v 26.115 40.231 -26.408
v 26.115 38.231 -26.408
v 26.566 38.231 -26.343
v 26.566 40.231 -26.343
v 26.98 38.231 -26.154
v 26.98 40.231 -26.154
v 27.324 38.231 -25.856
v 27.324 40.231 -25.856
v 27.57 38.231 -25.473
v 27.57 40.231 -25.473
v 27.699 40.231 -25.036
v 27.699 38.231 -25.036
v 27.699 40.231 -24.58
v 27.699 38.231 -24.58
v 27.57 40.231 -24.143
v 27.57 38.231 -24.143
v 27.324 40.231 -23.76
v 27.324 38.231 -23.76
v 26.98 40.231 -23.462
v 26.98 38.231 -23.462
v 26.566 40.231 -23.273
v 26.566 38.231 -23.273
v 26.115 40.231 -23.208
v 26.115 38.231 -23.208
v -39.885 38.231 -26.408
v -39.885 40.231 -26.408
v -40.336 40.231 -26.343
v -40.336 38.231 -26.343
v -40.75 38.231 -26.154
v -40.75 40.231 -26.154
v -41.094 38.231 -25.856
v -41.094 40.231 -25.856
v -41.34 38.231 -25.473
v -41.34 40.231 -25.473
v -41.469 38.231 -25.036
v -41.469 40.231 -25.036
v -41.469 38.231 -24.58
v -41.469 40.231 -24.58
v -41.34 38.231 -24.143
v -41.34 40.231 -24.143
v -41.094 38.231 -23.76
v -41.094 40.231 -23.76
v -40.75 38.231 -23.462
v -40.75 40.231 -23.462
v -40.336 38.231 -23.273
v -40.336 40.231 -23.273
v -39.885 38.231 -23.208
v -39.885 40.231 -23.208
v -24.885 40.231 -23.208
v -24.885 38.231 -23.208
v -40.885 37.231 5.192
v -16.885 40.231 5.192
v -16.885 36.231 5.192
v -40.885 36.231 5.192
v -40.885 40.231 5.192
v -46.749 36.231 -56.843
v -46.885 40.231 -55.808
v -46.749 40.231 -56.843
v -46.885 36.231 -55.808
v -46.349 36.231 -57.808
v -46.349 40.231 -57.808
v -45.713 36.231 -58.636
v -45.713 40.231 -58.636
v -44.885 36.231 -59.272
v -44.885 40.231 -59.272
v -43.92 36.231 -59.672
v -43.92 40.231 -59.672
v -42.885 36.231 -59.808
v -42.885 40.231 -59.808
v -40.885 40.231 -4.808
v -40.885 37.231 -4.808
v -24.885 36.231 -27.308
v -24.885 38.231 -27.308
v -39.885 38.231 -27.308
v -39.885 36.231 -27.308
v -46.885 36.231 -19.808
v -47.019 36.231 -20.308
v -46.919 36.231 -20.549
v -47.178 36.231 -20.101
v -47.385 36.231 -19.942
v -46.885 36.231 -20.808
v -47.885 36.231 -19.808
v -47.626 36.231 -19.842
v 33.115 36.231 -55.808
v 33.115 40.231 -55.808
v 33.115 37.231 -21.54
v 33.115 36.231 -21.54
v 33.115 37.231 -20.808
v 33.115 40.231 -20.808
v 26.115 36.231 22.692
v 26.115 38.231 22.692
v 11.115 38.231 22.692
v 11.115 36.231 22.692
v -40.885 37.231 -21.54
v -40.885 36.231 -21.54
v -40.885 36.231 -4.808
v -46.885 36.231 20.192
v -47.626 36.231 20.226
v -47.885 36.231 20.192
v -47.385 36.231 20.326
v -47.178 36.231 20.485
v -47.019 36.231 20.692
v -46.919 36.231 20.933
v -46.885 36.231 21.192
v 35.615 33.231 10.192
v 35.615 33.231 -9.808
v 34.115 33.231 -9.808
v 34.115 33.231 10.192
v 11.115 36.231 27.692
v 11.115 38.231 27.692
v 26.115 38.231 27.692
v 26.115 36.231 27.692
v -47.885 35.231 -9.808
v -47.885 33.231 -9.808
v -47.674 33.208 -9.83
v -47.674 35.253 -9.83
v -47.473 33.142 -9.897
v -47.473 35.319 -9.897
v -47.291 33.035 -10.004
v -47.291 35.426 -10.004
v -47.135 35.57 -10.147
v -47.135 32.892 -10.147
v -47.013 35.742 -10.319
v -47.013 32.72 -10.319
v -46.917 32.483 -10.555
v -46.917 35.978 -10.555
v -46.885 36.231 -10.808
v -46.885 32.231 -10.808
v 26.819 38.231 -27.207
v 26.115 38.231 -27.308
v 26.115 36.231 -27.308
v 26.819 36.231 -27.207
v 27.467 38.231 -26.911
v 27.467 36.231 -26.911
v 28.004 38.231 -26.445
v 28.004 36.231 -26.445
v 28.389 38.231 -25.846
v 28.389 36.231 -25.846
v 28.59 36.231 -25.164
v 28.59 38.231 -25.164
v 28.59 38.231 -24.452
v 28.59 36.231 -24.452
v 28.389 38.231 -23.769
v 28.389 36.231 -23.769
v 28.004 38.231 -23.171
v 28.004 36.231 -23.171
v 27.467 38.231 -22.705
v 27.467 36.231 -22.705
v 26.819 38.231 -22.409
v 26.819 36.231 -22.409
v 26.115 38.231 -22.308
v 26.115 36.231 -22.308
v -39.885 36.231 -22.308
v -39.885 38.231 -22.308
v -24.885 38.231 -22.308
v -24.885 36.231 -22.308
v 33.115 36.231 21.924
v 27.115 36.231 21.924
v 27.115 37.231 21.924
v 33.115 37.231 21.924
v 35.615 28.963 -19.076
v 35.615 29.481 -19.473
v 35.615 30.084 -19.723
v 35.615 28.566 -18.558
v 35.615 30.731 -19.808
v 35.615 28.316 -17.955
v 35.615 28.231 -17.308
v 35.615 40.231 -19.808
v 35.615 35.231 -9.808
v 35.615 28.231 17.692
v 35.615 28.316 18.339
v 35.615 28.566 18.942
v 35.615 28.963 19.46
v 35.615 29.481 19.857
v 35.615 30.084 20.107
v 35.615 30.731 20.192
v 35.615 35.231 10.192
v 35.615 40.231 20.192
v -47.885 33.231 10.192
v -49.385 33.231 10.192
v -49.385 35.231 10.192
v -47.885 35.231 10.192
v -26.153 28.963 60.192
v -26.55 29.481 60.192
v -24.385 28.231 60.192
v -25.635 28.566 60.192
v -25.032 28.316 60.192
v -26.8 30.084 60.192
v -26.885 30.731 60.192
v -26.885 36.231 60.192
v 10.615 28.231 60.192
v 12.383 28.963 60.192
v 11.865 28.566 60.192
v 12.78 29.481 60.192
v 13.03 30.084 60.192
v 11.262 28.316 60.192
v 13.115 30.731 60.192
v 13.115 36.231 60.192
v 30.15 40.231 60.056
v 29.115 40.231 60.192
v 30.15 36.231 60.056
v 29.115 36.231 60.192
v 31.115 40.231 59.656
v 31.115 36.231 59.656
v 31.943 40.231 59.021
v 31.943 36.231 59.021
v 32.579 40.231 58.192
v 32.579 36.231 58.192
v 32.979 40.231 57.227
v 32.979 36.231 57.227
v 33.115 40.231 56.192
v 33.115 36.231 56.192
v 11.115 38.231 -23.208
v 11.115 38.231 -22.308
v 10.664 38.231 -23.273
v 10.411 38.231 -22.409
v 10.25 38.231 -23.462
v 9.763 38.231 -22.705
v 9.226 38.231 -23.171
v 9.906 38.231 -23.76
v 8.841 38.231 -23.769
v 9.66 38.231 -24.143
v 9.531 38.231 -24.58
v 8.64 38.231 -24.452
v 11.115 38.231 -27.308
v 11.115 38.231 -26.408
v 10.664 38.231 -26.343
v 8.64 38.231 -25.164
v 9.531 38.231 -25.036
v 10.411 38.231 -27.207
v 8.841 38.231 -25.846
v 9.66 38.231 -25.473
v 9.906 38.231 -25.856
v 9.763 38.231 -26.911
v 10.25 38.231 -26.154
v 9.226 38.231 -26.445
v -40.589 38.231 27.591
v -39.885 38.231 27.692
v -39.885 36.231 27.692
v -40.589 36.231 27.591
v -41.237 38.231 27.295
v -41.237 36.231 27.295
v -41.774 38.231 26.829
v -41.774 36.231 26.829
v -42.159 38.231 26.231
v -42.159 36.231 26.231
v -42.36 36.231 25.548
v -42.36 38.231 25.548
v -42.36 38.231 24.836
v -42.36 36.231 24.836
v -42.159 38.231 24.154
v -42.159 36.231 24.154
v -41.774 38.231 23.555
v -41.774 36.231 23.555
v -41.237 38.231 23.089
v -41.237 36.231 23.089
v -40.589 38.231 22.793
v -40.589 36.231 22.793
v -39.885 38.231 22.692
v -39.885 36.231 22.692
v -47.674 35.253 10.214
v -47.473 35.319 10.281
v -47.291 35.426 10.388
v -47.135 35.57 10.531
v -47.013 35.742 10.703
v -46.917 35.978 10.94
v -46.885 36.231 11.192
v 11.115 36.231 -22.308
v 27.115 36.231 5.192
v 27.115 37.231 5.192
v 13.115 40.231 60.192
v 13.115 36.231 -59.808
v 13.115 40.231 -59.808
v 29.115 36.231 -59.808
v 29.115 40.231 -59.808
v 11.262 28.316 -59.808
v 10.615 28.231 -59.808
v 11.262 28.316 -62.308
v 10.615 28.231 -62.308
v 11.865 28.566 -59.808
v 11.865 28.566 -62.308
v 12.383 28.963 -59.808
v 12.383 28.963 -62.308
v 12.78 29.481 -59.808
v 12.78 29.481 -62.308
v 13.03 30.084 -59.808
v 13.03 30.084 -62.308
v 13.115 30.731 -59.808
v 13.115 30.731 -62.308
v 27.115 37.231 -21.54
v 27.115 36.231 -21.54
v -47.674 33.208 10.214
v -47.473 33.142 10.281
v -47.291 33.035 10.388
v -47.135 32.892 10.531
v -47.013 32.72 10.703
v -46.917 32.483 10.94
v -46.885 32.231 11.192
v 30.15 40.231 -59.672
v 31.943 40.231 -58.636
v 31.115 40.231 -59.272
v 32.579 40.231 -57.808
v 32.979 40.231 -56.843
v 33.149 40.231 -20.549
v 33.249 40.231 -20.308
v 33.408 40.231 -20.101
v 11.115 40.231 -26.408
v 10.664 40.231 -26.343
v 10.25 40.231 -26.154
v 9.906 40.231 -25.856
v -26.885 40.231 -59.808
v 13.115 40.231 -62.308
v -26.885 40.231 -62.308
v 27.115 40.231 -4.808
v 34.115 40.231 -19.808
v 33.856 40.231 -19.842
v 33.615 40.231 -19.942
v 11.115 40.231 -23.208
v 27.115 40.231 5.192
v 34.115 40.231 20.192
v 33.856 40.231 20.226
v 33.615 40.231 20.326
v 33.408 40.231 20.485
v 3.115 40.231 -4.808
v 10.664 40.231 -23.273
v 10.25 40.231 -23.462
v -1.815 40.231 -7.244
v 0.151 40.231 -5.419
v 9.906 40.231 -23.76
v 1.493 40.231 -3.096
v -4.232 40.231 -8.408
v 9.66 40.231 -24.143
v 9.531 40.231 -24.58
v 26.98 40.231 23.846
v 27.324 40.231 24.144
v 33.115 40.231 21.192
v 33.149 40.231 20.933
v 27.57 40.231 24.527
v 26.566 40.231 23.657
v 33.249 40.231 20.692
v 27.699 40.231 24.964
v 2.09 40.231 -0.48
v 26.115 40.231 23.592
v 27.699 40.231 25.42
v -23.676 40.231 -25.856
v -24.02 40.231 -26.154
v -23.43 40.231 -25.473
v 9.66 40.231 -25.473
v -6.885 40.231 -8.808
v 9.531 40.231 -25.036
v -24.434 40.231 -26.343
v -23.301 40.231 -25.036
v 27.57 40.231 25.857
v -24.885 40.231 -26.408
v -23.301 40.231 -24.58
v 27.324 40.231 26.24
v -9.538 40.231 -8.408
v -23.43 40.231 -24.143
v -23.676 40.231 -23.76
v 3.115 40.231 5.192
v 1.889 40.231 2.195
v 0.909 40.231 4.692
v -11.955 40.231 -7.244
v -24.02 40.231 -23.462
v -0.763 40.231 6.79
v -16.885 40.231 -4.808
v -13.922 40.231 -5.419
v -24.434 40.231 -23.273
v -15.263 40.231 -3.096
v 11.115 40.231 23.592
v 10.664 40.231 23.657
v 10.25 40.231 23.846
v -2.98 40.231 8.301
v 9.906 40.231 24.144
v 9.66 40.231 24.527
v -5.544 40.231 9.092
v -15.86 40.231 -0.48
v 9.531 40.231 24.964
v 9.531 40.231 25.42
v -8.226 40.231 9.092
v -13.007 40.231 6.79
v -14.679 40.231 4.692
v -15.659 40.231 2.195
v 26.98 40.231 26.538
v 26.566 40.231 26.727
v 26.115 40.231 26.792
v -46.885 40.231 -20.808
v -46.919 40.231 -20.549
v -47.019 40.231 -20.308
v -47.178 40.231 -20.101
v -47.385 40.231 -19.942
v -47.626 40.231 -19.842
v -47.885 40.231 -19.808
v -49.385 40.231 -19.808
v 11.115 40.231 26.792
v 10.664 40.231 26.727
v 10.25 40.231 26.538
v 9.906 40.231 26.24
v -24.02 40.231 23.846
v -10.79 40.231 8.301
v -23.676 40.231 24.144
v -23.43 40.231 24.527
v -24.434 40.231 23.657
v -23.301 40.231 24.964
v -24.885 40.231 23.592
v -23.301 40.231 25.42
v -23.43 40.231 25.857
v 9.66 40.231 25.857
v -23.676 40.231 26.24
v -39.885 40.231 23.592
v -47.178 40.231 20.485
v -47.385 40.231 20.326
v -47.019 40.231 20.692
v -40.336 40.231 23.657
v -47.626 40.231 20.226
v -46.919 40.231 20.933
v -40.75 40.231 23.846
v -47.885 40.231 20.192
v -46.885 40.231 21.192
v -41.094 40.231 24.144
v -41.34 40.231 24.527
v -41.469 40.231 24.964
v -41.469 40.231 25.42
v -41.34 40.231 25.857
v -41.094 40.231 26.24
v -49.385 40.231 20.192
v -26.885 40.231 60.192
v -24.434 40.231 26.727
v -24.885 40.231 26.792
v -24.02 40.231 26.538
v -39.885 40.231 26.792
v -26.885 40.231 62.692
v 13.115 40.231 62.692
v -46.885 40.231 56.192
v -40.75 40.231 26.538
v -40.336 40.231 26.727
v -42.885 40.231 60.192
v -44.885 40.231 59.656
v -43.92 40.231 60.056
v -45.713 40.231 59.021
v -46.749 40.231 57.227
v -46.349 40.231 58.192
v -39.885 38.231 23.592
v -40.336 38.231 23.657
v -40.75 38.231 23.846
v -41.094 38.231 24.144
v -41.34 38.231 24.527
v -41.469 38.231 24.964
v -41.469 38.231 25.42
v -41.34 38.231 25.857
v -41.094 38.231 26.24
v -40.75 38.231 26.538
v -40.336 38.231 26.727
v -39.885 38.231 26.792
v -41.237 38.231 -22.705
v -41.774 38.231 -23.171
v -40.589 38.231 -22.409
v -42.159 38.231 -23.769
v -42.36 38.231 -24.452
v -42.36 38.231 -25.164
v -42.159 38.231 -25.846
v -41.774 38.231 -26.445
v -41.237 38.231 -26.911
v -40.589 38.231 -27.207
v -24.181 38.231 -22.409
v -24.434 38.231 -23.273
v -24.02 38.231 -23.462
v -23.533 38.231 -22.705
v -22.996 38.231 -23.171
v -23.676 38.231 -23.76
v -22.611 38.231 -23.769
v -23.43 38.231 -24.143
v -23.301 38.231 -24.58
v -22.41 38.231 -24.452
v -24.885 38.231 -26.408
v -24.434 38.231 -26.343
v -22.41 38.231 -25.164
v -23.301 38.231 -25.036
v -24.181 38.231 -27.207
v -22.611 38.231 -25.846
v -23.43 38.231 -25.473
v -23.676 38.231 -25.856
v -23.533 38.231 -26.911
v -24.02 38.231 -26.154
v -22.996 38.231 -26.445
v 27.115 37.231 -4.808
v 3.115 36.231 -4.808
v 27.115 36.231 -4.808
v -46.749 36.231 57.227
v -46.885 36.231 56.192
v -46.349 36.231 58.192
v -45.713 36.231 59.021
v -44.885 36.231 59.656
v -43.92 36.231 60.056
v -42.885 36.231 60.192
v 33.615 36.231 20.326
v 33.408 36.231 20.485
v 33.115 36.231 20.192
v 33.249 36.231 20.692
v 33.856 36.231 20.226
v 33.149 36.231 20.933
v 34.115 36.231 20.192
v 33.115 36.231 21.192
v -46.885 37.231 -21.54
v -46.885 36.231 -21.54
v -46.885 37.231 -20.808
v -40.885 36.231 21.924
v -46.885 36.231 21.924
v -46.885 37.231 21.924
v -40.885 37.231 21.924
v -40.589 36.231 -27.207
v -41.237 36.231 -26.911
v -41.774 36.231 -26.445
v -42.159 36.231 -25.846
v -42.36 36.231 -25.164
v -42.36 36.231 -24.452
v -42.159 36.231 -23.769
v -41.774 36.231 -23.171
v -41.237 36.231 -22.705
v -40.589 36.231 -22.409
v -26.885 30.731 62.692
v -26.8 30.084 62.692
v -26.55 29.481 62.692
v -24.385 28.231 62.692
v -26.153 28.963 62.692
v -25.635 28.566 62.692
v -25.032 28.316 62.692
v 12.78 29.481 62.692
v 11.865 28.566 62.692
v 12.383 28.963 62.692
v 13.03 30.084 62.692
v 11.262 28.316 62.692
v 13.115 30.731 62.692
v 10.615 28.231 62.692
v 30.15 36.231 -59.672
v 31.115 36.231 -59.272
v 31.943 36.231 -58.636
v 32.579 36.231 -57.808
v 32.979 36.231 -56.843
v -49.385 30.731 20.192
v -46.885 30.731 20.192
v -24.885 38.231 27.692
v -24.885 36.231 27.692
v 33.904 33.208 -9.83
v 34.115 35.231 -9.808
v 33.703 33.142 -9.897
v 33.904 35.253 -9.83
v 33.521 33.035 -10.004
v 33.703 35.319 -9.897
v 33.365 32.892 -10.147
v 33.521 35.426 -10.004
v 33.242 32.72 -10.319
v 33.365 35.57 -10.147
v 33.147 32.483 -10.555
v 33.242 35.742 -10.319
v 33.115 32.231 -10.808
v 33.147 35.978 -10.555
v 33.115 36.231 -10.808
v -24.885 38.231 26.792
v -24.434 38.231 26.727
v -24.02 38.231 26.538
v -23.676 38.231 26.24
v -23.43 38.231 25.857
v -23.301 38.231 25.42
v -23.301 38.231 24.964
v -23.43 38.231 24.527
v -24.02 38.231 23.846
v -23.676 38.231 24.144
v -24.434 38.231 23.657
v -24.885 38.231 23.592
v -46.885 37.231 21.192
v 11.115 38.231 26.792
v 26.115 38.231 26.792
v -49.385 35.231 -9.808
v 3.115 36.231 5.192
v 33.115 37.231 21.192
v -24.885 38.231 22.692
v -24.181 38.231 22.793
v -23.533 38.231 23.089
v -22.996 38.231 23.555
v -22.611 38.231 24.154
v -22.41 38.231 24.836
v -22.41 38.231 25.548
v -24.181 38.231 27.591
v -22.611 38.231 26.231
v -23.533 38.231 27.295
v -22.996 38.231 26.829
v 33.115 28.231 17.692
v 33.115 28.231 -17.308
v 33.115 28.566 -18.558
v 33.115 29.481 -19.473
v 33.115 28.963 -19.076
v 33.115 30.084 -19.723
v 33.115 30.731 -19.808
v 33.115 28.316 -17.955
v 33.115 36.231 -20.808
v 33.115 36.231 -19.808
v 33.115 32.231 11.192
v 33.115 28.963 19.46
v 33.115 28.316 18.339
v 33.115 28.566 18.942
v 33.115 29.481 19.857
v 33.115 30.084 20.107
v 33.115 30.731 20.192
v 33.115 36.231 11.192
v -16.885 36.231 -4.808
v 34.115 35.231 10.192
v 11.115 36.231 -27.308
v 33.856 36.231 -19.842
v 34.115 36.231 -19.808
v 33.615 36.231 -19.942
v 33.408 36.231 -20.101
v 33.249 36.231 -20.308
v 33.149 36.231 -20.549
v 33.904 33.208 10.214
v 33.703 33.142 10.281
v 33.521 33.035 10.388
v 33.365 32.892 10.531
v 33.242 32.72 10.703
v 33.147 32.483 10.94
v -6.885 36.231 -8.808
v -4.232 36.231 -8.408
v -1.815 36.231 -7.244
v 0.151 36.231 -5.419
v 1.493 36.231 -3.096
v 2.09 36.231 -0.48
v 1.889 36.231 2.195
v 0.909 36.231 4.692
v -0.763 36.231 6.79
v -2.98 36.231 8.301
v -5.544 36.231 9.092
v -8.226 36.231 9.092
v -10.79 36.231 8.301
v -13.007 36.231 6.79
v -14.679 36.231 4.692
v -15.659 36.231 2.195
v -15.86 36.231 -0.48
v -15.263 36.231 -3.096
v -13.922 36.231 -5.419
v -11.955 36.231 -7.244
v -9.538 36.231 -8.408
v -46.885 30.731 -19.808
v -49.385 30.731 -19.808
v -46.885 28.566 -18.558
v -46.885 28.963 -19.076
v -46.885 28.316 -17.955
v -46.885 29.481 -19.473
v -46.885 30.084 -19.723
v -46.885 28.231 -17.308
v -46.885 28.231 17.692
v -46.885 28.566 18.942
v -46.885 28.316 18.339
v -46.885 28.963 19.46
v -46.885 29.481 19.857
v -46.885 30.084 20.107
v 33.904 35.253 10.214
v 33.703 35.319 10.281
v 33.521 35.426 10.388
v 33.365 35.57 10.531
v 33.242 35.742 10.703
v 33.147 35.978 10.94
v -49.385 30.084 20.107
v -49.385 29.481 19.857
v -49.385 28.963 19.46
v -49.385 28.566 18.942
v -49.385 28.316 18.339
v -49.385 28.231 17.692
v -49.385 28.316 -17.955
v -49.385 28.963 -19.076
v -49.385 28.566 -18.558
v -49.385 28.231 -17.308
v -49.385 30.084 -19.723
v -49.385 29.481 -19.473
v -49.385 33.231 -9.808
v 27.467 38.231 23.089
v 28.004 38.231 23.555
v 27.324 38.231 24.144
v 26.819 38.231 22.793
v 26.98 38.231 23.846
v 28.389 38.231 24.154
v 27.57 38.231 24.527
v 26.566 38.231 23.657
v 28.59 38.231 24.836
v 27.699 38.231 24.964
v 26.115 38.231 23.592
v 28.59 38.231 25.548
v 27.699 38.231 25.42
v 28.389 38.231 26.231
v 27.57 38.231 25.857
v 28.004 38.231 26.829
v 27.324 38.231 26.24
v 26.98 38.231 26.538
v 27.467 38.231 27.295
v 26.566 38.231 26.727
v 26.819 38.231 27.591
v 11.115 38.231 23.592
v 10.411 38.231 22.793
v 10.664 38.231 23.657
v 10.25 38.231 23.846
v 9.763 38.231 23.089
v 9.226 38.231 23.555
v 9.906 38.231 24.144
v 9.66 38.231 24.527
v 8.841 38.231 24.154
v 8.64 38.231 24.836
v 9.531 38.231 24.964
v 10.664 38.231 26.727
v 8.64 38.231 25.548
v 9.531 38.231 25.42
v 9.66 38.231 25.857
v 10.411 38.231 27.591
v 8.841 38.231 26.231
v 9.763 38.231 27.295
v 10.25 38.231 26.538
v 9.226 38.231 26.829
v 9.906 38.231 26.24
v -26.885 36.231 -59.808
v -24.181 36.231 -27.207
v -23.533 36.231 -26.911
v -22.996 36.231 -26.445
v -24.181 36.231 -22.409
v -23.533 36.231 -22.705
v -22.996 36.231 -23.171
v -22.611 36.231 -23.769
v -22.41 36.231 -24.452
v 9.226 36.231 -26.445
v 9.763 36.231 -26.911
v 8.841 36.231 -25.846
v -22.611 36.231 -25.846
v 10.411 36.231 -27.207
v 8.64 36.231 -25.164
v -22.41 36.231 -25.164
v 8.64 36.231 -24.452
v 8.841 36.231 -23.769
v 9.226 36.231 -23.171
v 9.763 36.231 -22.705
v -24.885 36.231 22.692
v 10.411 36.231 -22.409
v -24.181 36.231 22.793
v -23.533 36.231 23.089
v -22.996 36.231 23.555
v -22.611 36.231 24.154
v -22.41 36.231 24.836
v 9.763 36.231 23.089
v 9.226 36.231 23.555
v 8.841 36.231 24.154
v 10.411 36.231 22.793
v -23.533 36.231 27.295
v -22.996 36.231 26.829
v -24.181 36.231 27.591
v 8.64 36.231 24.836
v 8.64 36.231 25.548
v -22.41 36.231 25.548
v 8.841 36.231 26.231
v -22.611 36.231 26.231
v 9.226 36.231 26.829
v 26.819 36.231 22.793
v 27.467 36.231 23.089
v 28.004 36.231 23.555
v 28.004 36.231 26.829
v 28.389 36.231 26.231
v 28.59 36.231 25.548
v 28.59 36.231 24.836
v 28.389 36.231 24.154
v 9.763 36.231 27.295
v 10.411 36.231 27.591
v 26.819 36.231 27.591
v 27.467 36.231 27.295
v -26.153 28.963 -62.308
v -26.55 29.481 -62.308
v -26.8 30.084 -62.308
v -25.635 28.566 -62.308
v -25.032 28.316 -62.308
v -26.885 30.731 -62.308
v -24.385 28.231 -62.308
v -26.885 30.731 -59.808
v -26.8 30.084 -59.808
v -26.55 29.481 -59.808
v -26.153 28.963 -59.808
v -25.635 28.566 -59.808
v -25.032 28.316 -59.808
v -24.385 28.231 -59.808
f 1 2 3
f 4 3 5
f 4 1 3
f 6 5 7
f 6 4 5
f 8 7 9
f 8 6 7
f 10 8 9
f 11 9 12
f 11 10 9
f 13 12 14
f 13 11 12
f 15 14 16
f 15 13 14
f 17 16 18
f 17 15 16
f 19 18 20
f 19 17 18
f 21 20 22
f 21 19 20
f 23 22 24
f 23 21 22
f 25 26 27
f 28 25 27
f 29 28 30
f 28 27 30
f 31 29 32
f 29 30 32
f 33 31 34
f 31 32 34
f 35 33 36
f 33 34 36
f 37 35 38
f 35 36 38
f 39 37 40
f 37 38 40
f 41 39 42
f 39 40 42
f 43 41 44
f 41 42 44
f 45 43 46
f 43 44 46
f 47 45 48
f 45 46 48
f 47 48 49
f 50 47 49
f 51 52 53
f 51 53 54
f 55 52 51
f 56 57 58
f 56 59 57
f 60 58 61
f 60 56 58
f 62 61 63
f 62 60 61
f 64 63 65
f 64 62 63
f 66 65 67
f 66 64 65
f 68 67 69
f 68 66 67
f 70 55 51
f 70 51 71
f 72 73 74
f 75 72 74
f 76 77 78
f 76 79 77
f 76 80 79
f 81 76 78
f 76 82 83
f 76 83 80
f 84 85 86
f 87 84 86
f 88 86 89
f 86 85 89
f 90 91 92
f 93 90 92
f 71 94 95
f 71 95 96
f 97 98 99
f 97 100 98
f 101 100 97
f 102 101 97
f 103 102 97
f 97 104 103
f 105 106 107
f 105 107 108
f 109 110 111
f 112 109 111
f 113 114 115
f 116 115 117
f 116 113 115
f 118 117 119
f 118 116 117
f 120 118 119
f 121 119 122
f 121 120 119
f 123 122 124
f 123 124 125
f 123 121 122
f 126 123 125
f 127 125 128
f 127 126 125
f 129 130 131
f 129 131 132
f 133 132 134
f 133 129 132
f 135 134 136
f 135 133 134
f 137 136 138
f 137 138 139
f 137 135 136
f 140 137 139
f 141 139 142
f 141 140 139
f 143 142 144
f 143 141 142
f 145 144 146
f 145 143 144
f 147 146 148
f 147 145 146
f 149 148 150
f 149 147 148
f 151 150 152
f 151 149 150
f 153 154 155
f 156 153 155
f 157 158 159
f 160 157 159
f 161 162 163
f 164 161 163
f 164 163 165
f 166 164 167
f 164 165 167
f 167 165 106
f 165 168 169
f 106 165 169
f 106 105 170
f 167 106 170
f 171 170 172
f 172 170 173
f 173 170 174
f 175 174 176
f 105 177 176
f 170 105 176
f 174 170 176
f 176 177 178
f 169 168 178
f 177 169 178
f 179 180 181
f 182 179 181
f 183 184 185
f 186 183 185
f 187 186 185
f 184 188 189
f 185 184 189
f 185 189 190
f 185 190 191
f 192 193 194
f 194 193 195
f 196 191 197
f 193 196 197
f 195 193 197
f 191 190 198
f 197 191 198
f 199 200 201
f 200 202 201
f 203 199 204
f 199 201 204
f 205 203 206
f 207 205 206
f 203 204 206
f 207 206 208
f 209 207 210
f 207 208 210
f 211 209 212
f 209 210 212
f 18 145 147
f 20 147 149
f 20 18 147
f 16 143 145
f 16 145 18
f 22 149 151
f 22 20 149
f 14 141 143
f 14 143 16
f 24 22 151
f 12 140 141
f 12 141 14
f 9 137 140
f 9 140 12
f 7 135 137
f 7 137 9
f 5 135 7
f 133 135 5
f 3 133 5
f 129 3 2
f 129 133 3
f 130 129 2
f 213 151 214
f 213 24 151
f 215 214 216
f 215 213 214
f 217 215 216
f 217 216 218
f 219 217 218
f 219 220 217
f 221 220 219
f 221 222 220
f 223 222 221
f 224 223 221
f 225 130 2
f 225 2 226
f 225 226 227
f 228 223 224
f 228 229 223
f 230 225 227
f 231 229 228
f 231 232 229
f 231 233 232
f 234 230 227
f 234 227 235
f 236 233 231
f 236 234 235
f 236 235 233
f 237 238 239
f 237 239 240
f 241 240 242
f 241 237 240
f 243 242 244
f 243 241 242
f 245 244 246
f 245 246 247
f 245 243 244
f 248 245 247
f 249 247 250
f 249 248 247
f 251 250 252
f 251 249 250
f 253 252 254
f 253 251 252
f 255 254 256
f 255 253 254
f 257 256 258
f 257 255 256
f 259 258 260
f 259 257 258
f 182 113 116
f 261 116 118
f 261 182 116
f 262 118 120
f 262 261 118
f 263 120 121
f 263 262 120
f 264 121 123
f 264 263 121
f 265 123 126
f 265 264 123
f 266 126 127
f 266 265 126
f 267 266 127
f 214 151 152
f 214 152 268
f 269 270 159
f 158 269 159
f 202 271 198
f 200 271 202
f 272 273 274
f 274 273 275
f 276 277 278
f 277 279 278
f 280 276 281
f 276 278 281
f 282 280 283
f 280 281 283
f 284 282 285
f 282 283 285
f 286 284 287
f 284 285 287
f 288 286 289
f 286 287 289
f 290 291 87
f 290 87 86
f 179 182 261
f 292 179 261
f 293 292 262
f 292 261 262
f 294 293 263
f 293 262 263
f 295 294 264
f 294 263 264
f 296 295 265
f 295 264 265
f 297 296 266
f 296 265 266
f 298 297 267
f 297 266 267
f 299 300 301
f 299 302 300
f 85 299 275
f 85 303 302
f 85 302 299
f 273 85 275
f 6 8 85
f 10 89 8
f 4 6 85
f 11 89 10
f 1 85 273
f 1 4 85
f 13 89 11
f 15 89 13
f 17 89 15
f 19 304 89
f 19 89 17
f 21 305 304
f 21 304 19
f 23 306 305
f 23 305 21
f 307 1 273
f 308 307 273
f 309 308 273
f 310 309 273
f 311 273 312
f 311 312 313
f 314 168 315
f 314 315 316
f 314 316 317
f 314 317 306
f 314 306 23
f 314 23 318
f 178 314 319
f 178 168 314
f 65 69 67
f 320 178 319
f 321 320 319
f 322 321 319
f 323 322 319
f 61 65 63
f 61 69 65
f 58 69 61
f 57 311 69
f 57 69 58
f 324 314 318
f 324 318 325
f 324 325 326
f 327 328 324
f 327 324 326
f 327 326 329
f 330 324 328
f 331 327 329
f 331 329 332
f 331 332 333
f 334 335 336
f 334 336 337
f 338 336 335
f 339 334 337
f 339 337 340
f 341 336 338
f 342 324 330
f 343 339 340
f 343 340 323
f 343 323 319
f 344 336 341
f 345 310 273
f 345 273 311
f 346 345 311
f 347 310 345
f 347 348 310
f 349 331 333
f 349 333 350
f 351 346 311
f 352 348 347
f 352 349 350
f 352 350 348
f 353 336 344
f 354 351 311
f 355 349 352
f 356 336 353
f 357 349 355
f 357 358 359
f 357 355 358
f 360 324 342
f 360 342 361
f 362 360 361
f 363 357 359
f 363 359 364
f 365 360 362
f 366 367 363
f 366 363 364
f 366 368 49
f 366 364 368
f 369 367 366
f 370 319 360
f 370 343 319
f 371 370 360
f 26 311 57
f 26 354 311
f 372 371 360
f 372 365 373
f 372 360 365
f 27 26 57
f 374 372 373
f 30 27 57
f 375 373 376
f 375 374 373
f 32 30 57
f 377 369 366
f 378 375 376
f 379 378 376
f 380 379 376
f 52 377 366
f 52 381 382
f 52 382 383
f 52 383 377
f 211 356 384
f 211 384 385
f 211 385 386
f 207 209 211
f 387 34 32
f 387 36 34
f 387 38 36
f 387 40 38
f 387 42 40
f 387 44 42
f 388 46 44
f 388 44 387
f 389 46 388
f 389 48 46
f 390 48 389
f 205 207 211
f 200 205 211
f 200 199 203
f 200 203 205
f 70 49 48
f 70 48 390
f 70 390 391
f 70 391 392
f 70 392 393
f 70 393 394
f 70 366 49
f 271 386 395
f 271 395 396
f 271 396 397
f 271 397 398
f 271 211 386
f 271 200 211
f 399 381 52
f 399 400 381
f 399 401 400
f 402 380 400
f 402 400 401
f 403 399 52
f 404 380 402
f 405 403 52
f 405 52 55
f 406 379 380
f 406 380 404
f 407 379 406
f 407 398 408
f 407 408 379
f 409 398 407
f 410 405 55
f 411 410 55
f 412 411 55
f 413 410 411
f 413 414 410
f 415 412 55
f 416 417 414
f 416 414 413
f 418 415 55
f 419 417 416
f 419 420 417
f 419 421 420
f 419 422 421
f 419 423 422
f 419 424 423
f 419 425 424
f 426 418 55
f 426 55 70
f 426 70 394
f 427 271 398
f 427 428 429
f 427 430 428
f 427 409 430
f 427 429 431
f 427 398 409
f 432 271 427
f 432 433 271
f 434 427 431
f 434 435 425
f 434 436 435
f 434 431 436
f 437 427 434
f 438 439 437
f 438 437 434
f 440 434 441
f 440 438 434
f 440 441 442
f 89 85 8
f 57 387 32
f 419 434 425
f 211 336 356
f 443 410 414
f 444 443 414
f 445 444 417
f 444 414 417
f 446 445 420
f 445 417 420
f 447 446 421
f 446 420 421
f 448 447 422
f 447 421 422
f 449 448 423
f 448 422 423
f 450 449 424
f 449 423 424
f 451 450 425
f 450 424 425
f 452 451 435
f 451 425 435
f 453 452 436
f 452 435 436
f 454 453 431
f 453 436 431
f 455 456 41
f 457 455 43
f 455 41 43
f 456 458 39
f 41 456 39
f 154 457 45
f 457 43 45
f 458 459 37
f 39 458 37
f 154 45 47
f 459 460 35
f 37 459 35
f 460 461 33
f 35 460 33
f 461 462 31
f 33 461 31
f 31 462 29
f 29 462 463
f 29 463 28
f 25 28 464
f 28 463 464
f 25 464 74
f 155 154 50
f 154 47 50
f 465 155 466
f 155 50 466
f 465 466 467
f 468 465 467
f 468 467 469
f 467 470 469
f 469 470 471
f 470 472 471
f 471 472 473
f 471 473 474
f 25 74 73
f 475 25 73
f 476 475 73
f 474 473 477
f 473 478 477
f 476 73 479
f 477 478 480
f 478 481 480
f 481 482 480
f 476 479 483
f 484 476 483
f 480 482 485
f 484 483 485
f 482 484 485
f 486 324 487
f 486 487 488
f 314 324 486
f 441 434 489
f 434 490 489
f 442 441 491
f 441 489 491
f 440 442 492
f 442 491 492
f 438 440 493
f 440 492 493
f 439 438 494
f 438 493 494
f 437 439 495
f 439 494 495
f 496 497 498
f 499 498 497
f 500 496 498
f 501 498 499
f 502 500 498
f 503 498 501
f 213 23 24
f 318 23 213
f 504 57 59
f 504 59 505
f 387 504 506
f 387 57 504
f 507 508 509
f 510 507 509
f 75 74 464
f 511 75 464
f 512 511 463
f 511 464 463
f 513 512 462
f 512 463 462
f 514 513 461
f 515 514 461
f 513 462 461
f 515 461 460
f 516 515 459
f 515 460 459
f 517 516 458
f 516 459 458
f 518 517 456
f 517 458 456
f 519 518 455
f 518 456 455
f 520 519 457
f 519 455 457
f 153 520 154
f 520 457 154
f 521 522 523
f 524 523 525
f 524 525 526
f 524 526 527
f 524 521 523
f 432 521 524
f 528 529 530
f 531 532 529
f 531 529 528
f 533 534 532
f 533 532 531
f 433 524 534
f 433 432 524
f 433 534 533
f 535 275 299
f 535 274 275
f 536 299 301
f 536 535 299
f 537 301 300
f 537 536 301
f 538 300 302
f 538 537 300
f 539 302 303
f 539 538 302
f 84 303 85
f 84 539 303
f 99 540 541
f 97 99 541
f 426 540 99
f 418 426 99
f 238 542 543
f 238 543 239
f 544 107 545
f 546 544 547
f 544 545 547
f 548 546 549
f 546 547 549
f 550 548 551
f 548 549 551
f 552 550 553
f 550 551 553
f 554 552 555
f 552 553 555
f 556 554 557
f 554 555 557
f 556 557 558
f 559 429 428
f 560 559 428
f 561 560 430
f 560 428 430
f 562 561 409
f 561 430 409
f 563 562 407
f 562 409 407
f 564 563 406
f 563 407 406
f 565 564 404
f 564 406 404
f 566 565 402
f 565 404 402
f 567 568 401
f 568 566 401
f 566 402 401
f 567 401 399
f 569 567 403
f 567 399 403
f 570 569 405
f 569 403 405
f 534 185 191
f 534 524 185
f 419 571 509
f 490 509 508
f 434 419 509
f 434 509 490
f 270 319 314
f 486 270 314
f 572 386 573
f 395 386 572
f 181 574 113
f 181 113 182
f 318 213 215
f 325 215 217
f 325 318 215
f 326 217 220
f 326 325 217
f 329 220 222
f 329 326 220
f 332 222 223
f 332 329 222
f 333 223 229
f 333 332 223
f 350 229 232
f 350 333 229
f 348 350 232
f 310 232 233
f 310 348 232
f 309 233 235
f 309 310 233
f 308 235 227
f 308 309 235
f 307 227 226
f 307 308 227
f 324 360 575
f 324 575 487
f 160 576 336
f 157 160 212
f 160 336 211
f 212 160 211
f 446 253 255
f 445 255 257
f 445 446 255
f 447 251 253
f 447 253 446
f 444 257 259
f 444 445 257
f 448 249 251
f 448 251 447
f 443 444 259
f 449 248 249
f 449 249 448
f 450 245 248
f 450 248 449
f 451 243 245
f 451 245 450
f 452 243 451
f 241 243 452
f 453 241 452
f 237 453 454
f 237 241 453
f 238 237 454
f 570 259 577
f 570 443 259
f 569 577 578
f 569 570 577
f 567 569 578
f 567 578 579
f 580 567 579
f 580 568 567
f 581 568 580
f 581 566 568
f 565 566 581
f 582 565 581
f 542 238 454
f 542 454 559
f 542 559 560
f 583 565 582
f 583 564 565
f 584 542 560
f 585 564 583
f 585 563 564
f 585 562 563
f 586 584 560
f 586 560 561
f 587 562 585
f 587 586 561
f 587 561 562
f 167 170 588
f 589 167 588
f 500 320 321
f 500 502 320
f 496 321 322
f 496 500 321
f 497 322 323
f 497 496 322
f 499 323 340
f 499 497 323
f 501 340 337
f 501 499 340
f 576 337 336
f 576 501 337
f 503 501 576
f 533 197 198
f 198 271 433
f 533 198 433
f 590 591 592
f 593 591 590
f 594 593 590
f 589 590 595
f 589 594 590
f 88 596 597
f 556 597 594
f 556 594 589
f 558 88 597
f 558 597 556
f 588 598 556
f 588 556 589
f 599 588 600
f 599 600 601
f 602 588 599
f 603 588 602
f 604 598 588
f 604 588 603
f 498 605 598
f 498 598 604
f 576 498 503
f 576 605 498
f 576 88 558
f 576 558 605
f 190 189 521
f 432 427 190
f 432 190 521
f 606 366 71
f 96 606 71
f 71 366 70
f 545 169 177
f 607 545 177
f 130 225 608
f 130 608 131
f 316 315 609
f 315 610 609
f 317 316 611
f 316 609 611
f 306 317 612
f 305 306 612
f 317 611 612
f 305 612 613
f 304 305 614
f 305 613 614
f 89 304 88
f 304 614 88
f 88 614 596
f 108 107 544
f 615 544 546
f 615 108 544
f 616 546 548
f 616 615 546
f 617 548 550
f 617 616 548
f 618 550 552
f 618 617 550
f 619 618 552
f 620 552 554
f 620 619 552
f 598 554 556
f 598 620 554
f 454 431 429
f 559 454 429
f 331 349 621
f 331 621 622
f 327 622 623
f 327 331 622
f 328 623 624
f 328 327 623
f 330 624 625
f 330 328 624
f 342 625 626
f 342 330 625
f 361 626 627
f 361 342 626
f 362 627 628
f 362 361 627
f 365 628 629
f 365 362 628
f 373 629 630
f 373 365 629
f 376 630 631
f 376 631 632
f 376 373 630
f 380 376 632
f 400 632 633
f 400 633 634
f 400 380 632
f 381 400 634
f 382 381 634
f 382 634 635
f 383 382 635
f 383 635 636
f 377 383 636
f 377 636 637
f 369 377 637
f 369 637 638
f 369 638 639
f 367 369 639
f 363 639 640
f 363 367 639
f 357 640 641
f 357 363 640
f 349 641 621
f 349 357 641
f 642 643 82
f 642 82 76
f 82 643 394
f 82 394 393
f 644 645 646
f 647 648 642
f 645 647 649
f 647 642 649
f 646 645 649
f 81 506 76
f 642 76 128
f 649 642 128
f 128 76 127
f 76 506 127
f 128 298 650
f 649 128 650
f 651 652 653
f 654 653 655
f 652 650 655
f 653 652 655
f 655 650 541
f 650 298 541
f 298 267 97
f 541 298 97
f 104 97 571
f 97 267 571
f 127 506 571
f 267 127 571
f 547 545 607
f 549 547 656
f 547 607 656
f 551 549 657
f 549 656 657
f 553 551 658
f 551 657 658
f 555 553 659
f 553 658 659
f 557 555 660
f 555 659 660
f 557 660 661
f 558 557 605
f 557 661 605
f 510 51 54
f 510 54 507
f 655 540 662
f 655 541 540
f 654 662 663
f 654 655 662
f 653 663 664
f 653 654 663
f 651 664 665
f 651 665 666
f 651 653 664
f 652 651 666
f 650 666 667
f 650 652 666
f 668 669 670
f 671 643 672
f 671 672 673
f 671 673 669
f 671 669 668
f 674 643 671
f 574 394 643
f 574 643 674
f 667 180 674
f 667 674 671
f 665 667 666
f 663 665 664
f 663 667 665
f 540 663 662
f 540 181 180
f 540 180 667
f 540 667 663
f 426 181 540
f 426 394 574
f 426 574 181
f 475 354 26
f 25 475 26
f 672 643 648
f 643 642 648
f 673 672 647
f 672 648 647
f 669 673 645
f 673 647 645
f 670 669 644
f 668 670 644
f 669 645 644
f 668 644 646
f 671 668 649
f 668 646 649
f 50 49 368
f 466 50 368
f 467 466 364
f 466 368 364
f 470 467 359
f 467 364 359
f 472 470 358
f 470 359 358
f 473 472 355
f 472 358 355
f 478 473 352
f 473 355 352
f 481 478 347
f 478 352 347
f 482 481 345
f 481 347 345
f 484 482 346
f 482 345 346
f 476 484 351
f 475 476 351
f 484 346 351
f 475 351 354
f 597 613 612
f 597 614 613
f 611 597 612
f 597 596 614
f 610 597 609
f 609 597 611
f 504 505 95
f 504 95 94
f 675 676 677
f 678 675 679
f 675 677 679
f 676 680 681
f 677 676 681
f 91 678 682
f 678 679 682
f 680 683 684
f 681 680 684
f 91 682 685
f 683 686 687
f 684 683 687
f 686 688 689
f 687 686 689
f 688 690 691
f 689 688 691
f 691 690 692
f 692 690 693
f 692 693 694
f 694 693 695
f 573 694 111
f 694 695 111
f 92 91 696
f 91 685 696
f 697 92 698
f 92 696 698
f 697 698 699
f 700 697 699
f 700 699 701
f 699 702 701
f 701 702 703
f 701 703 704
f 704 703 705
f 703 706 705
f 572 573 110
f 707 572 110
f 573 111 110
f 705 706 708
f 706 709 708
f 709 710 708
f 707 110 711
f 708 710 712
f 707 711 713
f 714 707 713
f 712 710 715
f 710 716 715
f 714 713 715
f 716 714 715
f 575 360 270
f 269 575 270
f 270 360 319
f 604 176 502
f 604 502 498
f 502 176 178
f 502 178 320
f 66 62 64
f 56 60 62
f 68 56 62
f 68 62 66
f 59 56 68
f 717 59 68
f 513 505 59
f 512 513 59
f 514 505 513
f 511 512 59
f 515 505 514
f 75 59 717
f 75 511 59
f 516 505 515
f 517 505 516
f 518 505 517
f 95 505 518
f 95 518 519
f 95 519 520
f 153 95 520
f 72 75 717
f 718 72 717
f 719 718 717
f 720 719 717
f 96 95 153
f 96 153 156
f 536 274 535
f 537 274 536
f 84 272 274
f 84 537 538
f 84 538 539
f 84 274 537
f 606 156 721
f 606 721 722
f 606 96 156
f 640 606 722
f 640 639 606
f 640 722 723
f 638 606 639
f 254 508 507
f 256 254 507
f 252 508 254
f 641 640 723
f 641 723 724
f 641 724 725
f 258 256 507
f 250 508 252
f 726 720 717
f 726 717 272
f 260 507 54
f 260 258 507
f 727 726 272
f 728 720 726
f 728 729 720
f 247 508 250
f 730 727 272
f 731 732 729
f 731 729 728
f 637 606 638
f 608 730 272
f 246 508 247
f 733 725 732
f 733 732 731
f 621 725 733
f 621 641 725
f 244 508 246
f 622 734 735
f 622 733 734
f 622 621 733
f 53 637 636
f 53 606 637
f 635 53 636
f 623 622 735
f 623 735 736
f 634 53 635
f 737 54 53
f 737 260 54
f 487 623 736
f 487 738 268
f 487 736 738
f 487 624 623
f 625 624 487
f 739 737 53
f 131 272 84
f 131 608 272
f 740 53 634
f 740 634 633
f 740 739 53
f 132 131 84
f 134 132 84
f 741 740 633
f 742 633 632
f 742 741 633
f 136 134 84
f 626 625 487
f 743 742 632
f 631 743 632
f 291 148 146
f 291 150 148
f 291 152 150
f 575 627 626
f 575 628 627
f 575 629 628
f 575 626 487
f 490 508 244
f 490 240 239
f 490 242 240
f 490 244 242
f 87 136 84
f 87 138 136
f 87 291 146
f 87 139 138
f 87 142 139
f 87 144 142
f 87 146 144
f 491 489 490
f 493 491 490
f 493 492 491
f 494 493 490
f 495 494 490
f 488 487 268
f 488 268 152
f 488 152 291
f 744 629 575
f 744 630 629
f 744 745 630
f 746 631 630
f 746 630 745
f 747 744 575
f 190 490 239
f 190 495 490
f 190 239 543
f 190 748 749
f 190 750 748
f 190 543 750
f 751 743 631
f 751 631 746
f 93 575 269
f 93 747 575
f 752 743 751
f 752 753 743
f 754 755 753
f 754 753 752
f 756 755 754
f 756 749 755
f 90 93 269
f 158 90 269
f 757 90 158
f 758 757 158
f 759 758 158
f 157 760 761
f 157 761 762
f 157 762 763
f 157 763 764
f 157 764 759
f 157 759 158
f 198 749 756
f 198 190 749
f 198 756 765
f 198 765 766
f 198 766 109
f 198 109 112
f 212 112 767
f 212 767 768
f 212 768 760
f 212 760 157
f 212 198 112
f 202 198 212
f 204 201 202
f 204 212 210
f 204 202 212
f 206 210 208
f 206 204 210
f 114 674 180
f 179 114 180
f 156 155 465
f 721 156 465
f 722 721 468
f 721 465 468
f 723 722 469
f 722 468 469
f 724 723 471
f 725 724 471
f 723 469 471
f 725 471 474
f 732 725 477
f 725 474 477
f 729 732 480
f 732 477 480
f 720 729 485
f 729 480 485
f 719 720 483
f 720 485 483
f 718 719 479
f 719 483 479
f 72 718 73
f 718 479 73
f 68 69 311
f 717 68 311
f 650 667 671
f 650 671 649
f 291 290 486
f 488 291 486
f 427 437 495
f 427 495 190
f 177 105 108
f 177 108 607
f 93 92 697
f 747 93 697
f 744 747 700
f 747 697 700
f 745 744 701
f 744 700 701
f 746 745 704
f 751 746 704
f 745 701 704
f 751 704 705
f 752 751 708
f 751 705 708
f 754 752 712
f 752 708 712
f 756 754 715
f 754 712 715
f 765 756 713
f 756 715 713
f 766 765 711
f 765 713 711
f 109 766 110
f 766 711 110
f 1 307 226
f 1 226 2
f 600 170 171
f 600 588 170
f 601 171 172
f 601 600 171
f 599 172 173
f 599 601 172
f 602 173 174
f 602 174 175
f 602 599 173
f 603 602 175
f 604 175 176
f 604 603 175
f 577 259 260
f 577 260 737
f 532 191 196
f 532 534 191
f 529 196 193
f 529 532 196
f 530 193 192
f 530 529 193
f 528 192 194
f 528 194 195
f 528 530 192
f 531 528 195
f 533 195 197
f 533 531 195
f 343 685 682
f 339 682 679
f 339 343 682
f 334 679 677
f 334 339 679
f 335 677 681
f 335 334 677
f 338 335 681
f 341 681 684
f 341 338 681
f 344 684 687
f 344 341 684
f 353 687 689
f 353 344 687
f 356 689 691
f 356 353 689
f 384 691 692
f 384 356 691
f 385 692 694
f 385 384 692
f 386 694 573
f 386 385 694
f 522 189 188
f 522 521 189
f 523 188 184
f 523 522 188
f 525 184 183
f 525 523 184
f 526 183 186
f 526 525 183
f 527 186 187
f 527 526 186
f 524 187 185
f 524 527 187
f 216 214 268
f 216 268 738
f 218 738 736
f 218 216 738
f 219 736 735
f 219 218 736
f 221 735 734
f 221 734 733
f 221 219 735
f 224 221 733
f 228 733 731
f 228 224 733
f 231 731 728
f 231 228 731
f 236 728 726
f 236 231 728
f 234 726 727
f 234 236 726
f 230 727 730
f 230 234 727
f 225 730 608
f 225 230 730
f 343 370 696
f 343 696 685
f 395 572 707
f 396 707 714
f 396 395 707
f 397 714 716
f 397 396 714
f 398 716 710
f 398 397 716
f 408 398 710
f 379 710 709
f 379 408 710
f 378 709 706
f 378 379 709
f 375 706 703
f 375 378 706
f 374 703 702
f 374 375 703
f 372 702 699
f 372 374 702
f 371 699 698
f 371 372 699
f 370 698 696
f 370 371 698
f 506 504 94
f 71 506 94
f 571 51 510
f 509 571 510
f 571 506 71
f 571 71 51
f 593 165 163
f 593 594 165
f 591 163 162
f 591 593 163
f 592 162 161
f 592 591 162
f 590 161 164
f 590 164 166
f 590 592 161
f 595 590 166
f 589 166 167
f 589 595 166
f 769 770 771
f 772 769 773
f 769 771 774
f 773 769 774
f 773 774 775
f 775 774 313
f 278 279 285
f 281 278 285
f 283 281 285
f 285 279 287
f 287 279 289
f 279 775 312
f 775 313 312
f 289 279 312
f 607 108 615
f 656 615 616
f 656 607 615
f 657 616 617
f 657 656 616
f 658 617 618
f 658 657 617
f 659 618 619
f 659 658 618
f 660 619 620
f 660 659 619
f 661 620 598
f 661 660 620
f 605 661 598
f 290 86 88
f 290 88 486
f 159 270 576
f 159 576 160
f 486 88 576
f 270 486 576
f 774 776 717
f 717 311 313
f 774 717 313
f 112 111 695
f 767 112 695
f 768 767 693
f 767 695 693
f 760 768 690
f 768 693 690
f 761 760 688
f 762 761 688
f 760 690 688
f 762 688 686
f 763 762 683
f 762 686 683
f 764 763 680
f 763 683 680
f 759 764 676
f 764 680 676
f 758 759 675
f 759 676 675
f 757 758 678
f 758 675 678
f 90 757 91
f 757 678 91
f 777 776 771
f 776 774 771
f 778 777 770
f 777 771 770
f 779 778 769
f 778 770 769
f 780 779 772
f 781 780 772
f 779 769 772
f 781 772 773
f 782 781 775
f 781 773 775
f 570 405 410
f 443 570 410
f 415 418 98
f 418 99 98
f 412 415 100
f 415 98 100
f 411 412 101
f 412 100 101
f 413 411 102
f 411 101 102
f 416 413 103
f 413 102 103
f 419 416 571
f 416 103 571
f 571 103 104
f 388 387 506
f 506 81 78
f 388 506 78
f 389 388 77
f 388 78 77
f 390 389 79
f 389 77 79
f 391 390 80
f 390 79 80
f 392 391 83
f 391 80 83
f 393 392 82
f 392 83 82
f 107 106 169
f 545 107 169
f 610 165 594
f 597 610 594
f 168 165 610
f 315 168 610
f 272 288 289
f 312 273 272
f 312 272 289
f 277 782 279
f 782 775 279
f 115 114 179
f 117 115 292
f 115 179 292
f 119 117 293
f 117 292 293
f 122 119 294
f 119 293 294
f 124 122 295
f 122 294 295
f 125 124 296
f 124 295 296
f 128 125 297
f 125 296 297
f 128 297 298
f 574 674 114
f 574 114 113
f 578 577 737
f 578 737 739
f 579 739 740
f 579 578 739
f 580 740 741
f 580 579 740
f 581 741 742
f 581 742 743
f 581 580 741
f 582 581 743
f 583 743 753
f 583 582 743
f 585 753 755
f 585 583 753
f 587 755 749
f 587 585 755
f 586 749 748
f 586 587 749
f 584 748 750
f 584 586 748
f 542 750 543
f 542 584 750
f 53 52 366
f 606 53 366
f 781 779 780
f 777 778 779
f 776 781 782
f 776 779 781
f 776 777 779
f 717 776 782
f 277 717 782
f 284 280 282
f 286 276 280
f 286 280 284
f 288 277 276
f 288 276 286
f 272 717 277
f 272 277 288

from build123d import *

# Parameters (mm, degrees)
SKETCH2_W                                 = 80
SKETCH2_H                                 = 120
SKETCH2_R                                 = 9
BOSS_EXTRUDE1_DEPTH                       = 4
FILLET1_R                                 = 4
BOSS_EXTRUDE3_START                       = -4
SKETCH3_W                                 = 40
SKETCH3_H                                 = 2.5
BOSS_EXTRUDE3_DEPTH                       = 12
FILLET5_R                                 = 2.5
FILLET5_OF_MIRROR6_R                      = 2.5
BOSS_EXTRUDE4_START                       = -4
SKETCH6_W                                 = 2.5
SKETCH6_H                                 = 39.999999999
BOSS_EXTRUDE4_DEPTH                       = 12
SKETCH13_W                                = 20
SKETCH13_H                                = 2
CUT_EXTRUDE6_DEPTH                        = 2.5
FILLET15_R                                = 1
FILLET15_OF_MIRROR31_R                    = 1
FILLET12_R                                = 1
FILLET9_R                                 = 2.5
SKETCH15_W                                = 24
SKETCH15_H                                = 10
CUT_EXTRUDE7_DEPTH                        = 4
SKETCH16_W                                = 43.464101615
SKETCH16_H                                = 1
CUT_EXTRUDE8_DEPTH                        = 6
CUT_EXTRUDE9_START                        = -2
CUT_EXTRUDE9_DEPTH                        = 2
MIRROR35_START                            = -2
MIRROR35_AT_THE_SECOND_PLANE_COPY_1_DEPTH = 2


with BuildPart() as part:
    # Sketch2 → Boss-Extrude1 (new body)
    with BuildSketch(Plane.XZ.offset(-40.230846757)):
        with Locations((-6.885042722, 0.192082071)):
            Rectangle(SKETCH2_W, SKETCH2_H)
        with Locations(Location((-6.885042722, 0.192082071, 0), (0, 0, 270))):
            Circle(SKETCH2_R, mode=Mode.SUBTRACT)
        with BuildLine():
            Line((-24.885042722, -26.407917929), (-39.885042722, -26.407917929))
            ThreePointArc((-39.885042722, -26.407917929), (-41.485042722, -24.807917929), (-39.885042722, -23.207917929))
            Line((-39.885042722, -23.207917929), (-24.885042722, -23.207917929))
            ThreePointArc((-24.885042722, -23.207917929), (-23.285042722, -24.807917929), (-24.885042722, -26.407917929))
        make_face(mode=Mode.SUBTRACT)
        with BuildLine():
            Line((-24.885042722, 23.592082071), (-39.885042722, 23.592082071))
            ThreePointArc((-39.885042722, 23.592082071), (-41.485042722, 25.192082071), (-39.885042722, 26.792082071))
            Line((-39.885042722, 26.792082071), (-24.885042722, 26.792082071))
            ThreePointArc((-24.885042722, 26.792082071), (-23.285042722, 25.192082071), (-24.885042722, 23.592082071))
        make_face(mode=Mode.SUBTRACT)
        with BuildLine():
            Line((26.114957278, 26.792082071), (11.114957278, 26.792082071))
            ThreePointArc((11.114957278, 26.792082071), (9.514957278, 25.192082071), (11.114957278, 23.592082071))
            Line((11.114957278, 23.592082071), (26.114957278, 23.592082071))
            ThreePointArc((26.114957278, 23.592082071), (27.714957278, 25.192082071), (26.114957278, 26.792082071))
        make_face(mode=Mode.SUBTRACT)
        with BuildLine():
            Line((26.114957278, -23.207917929), (11.114957278, -23.207917929))
            ThreePointArc((11.114957278, -23.207917929), (9.514957278, -24.807917929), (11.114957278, -26.407917929))
            Line((11.114957278, -26.407917929), (26.114957278, -26.407917929))
            ThreePointArc((26.114957278, -26.407917929), (27.714957278, -24.807917929), (26.114957278, -23.207917929))
        make_face(mode=Mode.SUBTRACT)
    extrude(amount=BOSS_EXTRUDE1_DEPTH)

    # Fillet1
    fillet1_edges = [part.edges().sort_by_distance(p)[0] for p in [
        (33.114957278, 38.230846757, -59.807917929),
        (-46.885042722, 38.230846757, -59.807917929),
        (-46.885042722, 38.230846757, 60.192082071),
        (33.114957278, 38.230846757, 60.192082071),
    ]]
    fillet(fillet1_edges, radius=FILLET1_R)

    # Sketch3 → Boss-Extrude3 (add)
    with BuildSketch(Plane.XZ.offset(-36.230846757).offset(BOSS_EXTRUDE3_START)):
        with Locations((-6.885042722, 61.442082071)):
            Rectangle(SKETCH3_W, SKETCH3_H)
    boss_extrude3 = extrude(amount=BOSS_EXTRUDE3_DEPTH)

    # Fillet5
    fillet5_edges = [part.edges().sort_by_distance(p)[0] for p in [
        (13.114957278, 28.230846757, 61.442082071),
        (-26.885042722, 28.230846757, 61.442082071),
    ]]
    fillet(fillet5_edges, radius=FILLET5_R)

    # Mirror6: Boss-Extrude3 across plane
    add(boss_extrude3.mirror(Plane(origin=(0, 0, 0.192082071), x_dir=(1, 0, 0), z_dir=(0, 0, -1))))

    # Fillet5 of Mirror6
    fillet5_of_mirror6_edges = [part.edges().sort_by_distance(p)[0] for p in [
        (13.114957278, 28.230846757, -61.057917929),
        (-26.885042722, 28.230846757, -61.057917929),
    ]]
    fillet(fillet5_of_mirror6_edges, radius=FILLET5_OF_MIRROR6_R)

    # Sketch6 → Boss-Extrude4 (add)
    with BuildSketch(Plane.XZ.offset(-36.230846757).offset(BOSS_EXTRUDE4_START)):
        with Locations((-48.135042722, 0.19208207)):
            Rectangle(SKETCH6_W, SKETCH6_H)
    boss_extrude4 = extrude(amount=BOSS_EXTRUDE4_DEPTH)

    # Sketch13 → Cut-Extrude6 (cut)
    with BuildSketch(Plane.ZY.offset(49.385042722)):
        with Locations((0.192082071, 34.230846757)):
            Rectangle(SKETCH13_W, SKETCH13_H)
    cut_extrude6 = extrude(amount=-CUT_EXTRUDE6_DEPTH, mode=Mode.SUBTRACT)

    # Fillet15
    fillet15_edges = [part.edges().sort_by_distance(p)[0] for p in [
        (-46.885042722, 35.230846757, 0.192082071),
        (-46.885042722, 34.230846757, -9.807917929),
        (-46.885042722, 33.230846757, 0.192082071),
        (-46.885042722, 34.230846757, 10.192082071),
    ]]
    fillet(fillet15_edges, radius=FILLET15_R - 0.0001)  # a hair under: the kernel refuses the full size

    # Mirror31: Boss-Extrude4, Cut-Extrude6 across plane
    add(boss_extrude4.mirror(Plane.ZY.offset(6.885042722)))
    add(cut_extrude6.mirror(Plane.ZY.offset(6.885042722)), mode=Mode.SUBTRACT)

    # Fillet15 of Mirror31
    fillet15_of_mirror31_edges = [part.edges().sort_by_distance(p)[0] for p in [
        (33.114957278, 35.230846757, 0.192082071),
        (33.114957278, 34.230846757, -9.807917929),
        (33.114957278, 33.230846757, 0.192082071),
        (33.114957278, 34.230846757, 10.192082071),
    ]]
    fillet(fillet15_of_mirror31_edges, radius=FILLET15_OF_MIRROR31_R - 0.0001)  # a hair under: the kernel refuses the full size

    # Fillet12
    fillet12_edges = [part.edges().sort_by_distance(p)[0] for p in [
        (-46.885042722, 38.230846757, 20.19208207),
        (-46.885042722, 38.230846757, -19.807917929),
        (33.114957278, 38.230846757, -19.807917929),
        (33.114957278, 38.230846757, 20.19208207),
    ]]
    fillet(fillet12_edges, radius=FILLET12_R)

    # Fillet9
    fillet9_edges = [part.edges().sort_by_distance(p)[0] for p in [
        (-48.135042722, 28.230846757, -19.807917929),
        (-48.135042722, 28.230846757, 20.19208207),
        (34.364957278, 28.230846757, -19.807917929),
        (34.364957278, 28.230846757, 20.19208207),
    ]]
    fillet(fillet9_edges, radius=FILLET9_R)

    # Sketch15 → Cut-Extrude7 (cut)
    with BuildSketch(Plane(origin=(0, 40.230846757, 0), x_dir=(1, 0, 0), z_dir=(0, 1, 0))):
        with Locations((15.114957278, -0.192082071)):
            Rectangle(SKETCH15_W, SKETCH15_H)
    cut_extrude7 = extrude(amount=-CUT_EXTRUDE7_DEPTH, mode=Mode.SUBTRACT)

    # Mirror32: Cut-Extrude7 across plane
    add(cut_extrude7.mirror(Plane.ZY.offset(6.885042722)), mode=Mode.SUBTRACT)

    # Sketch16 → Cut-Extrude8 (cut)
    with BuildSketch(Plane.ZY.offset(46.885042722)):
        with Locations((0.19208207, 36.730846757)):
            Rectangle(SKETCH16_W, SKETCH16_H)
    cut_extrude8 = extrude(amount=-CUT_EXTRUDE8_DEPTH, mode=Mode.SUBTRACT)

    # Mirror34: Cut-Extrude8 across plane
    add(cut_extrude8.mirror(Plane.ZY.offset(6.885042722)), mode=Mode.SUBTRACT)

    # Sketch17 → Cut-Extrude9 (cut)
    with BuildSketch(Plane.XZ.offset(-36.230846757).offset(CUT_EXTRUDE9_START)):
        with BuildLine():
            Line((-39.885042722, 22.692082071), (-24.885042722, 22.692082071))
            ThreePointArc((-24.885042722, 22.692082071), (-22.385042722, 25.192082071), (-24.885042722, 27.692082071))
            Line((-24.885042722, 27.692082071), (-39.885042722, 27.692082071))
            ThreePointArc((-39.885042722, 27.692082071), (-42.385042722, 25.192082071), (-39.885042722, 22.692082071))
        make_face()
        with BuildLine():
            Line((-39.885042722, 23.592082071), (-24.885042722, 23.592082071))
            ThreePointArc((-24.885042722, 23.592082071), (-23.285042722, 25.192082071), (-24.885042722, 26.792082071))
            Line((-24.885042722, 26.792082071), (-39.885042722, 26.792082071))
            ThreePointArc((-39.885042722, 26.792082071), (-41.485042722, 25.192082071), (-39.885042722, 23.592082071))
        make_face(mode=Mode.SUBTRACT)
    cut_extrude9 = extrude(amount=CUT_EXTRUDE9_DEPTH, mode=Mode.SUBTRACT)

    # Mirror35: Cut-Extrude9 across plane
    add(cut_extrude9.mirror(Plane(origin=(0, 0, 0.192082071), x_dir=(1, 0, 0), z_dir=(0, 0, -1))), mode=Mode.SUBTRACT)

    # Mirror35 at the second plane: Cut-Extrude9 across plane
    add(cut_extrude9.mirror(Plane.ZY.offset(6.885042722)), mode=Mode.SUBTRACT)

    # Mirror35 at the second plane copy 1 sket → Mirror35 at the second plane copy 1 (cut)
    with BuildSketch(Plane(origin=(-13.770085443, 36.230846757, 0.384164141), x_dir=(-1, 0, 0), z_dir=(0, -1, 0)).offset(MIRROR35_START)):
        with BuildLine():
            Line((-39.885042722, 22.692082071), (-24.885042722, 22.692082071))
            ThreePointArc((-24.885042722, 22.692082071), (-22.385042722, 25.192082071), (-24.885042722, 27.692082071))
            Line((-24.885042722, 27.692082071), (-39.885042722, 27.692082071))
            ThreePointArc((-39.885042722, 27.692082071), (-42.385042722, 25.192082071), (-39.885042722, 22.692082071))
        make_face()
        with BuildLine():
            Line((-39.885042722, 23.592082071), (-24.885042722, 23.592082071))
            ThreePointArc((-24.885042722, 23.592082071), (-23.285042722, 25.192082071), (-24.885042722, 26.792082071))
            Line((-24.885042722, 26.792082071), (-39.885042722, 26.792082071))
            ThreePointArc((-39.885042722, 26.792082071), (-41.485042722, 25.192082071), (-39.885042722, 23.592082071))
        make_face(mode=Mode.SUBTRACT)
    extrude(amount=MIRROR35_AT_THE_SECOND_PLANE_COPY_1_DEPTH, mode=Mode.SUBTRACT)


solid = part.part
